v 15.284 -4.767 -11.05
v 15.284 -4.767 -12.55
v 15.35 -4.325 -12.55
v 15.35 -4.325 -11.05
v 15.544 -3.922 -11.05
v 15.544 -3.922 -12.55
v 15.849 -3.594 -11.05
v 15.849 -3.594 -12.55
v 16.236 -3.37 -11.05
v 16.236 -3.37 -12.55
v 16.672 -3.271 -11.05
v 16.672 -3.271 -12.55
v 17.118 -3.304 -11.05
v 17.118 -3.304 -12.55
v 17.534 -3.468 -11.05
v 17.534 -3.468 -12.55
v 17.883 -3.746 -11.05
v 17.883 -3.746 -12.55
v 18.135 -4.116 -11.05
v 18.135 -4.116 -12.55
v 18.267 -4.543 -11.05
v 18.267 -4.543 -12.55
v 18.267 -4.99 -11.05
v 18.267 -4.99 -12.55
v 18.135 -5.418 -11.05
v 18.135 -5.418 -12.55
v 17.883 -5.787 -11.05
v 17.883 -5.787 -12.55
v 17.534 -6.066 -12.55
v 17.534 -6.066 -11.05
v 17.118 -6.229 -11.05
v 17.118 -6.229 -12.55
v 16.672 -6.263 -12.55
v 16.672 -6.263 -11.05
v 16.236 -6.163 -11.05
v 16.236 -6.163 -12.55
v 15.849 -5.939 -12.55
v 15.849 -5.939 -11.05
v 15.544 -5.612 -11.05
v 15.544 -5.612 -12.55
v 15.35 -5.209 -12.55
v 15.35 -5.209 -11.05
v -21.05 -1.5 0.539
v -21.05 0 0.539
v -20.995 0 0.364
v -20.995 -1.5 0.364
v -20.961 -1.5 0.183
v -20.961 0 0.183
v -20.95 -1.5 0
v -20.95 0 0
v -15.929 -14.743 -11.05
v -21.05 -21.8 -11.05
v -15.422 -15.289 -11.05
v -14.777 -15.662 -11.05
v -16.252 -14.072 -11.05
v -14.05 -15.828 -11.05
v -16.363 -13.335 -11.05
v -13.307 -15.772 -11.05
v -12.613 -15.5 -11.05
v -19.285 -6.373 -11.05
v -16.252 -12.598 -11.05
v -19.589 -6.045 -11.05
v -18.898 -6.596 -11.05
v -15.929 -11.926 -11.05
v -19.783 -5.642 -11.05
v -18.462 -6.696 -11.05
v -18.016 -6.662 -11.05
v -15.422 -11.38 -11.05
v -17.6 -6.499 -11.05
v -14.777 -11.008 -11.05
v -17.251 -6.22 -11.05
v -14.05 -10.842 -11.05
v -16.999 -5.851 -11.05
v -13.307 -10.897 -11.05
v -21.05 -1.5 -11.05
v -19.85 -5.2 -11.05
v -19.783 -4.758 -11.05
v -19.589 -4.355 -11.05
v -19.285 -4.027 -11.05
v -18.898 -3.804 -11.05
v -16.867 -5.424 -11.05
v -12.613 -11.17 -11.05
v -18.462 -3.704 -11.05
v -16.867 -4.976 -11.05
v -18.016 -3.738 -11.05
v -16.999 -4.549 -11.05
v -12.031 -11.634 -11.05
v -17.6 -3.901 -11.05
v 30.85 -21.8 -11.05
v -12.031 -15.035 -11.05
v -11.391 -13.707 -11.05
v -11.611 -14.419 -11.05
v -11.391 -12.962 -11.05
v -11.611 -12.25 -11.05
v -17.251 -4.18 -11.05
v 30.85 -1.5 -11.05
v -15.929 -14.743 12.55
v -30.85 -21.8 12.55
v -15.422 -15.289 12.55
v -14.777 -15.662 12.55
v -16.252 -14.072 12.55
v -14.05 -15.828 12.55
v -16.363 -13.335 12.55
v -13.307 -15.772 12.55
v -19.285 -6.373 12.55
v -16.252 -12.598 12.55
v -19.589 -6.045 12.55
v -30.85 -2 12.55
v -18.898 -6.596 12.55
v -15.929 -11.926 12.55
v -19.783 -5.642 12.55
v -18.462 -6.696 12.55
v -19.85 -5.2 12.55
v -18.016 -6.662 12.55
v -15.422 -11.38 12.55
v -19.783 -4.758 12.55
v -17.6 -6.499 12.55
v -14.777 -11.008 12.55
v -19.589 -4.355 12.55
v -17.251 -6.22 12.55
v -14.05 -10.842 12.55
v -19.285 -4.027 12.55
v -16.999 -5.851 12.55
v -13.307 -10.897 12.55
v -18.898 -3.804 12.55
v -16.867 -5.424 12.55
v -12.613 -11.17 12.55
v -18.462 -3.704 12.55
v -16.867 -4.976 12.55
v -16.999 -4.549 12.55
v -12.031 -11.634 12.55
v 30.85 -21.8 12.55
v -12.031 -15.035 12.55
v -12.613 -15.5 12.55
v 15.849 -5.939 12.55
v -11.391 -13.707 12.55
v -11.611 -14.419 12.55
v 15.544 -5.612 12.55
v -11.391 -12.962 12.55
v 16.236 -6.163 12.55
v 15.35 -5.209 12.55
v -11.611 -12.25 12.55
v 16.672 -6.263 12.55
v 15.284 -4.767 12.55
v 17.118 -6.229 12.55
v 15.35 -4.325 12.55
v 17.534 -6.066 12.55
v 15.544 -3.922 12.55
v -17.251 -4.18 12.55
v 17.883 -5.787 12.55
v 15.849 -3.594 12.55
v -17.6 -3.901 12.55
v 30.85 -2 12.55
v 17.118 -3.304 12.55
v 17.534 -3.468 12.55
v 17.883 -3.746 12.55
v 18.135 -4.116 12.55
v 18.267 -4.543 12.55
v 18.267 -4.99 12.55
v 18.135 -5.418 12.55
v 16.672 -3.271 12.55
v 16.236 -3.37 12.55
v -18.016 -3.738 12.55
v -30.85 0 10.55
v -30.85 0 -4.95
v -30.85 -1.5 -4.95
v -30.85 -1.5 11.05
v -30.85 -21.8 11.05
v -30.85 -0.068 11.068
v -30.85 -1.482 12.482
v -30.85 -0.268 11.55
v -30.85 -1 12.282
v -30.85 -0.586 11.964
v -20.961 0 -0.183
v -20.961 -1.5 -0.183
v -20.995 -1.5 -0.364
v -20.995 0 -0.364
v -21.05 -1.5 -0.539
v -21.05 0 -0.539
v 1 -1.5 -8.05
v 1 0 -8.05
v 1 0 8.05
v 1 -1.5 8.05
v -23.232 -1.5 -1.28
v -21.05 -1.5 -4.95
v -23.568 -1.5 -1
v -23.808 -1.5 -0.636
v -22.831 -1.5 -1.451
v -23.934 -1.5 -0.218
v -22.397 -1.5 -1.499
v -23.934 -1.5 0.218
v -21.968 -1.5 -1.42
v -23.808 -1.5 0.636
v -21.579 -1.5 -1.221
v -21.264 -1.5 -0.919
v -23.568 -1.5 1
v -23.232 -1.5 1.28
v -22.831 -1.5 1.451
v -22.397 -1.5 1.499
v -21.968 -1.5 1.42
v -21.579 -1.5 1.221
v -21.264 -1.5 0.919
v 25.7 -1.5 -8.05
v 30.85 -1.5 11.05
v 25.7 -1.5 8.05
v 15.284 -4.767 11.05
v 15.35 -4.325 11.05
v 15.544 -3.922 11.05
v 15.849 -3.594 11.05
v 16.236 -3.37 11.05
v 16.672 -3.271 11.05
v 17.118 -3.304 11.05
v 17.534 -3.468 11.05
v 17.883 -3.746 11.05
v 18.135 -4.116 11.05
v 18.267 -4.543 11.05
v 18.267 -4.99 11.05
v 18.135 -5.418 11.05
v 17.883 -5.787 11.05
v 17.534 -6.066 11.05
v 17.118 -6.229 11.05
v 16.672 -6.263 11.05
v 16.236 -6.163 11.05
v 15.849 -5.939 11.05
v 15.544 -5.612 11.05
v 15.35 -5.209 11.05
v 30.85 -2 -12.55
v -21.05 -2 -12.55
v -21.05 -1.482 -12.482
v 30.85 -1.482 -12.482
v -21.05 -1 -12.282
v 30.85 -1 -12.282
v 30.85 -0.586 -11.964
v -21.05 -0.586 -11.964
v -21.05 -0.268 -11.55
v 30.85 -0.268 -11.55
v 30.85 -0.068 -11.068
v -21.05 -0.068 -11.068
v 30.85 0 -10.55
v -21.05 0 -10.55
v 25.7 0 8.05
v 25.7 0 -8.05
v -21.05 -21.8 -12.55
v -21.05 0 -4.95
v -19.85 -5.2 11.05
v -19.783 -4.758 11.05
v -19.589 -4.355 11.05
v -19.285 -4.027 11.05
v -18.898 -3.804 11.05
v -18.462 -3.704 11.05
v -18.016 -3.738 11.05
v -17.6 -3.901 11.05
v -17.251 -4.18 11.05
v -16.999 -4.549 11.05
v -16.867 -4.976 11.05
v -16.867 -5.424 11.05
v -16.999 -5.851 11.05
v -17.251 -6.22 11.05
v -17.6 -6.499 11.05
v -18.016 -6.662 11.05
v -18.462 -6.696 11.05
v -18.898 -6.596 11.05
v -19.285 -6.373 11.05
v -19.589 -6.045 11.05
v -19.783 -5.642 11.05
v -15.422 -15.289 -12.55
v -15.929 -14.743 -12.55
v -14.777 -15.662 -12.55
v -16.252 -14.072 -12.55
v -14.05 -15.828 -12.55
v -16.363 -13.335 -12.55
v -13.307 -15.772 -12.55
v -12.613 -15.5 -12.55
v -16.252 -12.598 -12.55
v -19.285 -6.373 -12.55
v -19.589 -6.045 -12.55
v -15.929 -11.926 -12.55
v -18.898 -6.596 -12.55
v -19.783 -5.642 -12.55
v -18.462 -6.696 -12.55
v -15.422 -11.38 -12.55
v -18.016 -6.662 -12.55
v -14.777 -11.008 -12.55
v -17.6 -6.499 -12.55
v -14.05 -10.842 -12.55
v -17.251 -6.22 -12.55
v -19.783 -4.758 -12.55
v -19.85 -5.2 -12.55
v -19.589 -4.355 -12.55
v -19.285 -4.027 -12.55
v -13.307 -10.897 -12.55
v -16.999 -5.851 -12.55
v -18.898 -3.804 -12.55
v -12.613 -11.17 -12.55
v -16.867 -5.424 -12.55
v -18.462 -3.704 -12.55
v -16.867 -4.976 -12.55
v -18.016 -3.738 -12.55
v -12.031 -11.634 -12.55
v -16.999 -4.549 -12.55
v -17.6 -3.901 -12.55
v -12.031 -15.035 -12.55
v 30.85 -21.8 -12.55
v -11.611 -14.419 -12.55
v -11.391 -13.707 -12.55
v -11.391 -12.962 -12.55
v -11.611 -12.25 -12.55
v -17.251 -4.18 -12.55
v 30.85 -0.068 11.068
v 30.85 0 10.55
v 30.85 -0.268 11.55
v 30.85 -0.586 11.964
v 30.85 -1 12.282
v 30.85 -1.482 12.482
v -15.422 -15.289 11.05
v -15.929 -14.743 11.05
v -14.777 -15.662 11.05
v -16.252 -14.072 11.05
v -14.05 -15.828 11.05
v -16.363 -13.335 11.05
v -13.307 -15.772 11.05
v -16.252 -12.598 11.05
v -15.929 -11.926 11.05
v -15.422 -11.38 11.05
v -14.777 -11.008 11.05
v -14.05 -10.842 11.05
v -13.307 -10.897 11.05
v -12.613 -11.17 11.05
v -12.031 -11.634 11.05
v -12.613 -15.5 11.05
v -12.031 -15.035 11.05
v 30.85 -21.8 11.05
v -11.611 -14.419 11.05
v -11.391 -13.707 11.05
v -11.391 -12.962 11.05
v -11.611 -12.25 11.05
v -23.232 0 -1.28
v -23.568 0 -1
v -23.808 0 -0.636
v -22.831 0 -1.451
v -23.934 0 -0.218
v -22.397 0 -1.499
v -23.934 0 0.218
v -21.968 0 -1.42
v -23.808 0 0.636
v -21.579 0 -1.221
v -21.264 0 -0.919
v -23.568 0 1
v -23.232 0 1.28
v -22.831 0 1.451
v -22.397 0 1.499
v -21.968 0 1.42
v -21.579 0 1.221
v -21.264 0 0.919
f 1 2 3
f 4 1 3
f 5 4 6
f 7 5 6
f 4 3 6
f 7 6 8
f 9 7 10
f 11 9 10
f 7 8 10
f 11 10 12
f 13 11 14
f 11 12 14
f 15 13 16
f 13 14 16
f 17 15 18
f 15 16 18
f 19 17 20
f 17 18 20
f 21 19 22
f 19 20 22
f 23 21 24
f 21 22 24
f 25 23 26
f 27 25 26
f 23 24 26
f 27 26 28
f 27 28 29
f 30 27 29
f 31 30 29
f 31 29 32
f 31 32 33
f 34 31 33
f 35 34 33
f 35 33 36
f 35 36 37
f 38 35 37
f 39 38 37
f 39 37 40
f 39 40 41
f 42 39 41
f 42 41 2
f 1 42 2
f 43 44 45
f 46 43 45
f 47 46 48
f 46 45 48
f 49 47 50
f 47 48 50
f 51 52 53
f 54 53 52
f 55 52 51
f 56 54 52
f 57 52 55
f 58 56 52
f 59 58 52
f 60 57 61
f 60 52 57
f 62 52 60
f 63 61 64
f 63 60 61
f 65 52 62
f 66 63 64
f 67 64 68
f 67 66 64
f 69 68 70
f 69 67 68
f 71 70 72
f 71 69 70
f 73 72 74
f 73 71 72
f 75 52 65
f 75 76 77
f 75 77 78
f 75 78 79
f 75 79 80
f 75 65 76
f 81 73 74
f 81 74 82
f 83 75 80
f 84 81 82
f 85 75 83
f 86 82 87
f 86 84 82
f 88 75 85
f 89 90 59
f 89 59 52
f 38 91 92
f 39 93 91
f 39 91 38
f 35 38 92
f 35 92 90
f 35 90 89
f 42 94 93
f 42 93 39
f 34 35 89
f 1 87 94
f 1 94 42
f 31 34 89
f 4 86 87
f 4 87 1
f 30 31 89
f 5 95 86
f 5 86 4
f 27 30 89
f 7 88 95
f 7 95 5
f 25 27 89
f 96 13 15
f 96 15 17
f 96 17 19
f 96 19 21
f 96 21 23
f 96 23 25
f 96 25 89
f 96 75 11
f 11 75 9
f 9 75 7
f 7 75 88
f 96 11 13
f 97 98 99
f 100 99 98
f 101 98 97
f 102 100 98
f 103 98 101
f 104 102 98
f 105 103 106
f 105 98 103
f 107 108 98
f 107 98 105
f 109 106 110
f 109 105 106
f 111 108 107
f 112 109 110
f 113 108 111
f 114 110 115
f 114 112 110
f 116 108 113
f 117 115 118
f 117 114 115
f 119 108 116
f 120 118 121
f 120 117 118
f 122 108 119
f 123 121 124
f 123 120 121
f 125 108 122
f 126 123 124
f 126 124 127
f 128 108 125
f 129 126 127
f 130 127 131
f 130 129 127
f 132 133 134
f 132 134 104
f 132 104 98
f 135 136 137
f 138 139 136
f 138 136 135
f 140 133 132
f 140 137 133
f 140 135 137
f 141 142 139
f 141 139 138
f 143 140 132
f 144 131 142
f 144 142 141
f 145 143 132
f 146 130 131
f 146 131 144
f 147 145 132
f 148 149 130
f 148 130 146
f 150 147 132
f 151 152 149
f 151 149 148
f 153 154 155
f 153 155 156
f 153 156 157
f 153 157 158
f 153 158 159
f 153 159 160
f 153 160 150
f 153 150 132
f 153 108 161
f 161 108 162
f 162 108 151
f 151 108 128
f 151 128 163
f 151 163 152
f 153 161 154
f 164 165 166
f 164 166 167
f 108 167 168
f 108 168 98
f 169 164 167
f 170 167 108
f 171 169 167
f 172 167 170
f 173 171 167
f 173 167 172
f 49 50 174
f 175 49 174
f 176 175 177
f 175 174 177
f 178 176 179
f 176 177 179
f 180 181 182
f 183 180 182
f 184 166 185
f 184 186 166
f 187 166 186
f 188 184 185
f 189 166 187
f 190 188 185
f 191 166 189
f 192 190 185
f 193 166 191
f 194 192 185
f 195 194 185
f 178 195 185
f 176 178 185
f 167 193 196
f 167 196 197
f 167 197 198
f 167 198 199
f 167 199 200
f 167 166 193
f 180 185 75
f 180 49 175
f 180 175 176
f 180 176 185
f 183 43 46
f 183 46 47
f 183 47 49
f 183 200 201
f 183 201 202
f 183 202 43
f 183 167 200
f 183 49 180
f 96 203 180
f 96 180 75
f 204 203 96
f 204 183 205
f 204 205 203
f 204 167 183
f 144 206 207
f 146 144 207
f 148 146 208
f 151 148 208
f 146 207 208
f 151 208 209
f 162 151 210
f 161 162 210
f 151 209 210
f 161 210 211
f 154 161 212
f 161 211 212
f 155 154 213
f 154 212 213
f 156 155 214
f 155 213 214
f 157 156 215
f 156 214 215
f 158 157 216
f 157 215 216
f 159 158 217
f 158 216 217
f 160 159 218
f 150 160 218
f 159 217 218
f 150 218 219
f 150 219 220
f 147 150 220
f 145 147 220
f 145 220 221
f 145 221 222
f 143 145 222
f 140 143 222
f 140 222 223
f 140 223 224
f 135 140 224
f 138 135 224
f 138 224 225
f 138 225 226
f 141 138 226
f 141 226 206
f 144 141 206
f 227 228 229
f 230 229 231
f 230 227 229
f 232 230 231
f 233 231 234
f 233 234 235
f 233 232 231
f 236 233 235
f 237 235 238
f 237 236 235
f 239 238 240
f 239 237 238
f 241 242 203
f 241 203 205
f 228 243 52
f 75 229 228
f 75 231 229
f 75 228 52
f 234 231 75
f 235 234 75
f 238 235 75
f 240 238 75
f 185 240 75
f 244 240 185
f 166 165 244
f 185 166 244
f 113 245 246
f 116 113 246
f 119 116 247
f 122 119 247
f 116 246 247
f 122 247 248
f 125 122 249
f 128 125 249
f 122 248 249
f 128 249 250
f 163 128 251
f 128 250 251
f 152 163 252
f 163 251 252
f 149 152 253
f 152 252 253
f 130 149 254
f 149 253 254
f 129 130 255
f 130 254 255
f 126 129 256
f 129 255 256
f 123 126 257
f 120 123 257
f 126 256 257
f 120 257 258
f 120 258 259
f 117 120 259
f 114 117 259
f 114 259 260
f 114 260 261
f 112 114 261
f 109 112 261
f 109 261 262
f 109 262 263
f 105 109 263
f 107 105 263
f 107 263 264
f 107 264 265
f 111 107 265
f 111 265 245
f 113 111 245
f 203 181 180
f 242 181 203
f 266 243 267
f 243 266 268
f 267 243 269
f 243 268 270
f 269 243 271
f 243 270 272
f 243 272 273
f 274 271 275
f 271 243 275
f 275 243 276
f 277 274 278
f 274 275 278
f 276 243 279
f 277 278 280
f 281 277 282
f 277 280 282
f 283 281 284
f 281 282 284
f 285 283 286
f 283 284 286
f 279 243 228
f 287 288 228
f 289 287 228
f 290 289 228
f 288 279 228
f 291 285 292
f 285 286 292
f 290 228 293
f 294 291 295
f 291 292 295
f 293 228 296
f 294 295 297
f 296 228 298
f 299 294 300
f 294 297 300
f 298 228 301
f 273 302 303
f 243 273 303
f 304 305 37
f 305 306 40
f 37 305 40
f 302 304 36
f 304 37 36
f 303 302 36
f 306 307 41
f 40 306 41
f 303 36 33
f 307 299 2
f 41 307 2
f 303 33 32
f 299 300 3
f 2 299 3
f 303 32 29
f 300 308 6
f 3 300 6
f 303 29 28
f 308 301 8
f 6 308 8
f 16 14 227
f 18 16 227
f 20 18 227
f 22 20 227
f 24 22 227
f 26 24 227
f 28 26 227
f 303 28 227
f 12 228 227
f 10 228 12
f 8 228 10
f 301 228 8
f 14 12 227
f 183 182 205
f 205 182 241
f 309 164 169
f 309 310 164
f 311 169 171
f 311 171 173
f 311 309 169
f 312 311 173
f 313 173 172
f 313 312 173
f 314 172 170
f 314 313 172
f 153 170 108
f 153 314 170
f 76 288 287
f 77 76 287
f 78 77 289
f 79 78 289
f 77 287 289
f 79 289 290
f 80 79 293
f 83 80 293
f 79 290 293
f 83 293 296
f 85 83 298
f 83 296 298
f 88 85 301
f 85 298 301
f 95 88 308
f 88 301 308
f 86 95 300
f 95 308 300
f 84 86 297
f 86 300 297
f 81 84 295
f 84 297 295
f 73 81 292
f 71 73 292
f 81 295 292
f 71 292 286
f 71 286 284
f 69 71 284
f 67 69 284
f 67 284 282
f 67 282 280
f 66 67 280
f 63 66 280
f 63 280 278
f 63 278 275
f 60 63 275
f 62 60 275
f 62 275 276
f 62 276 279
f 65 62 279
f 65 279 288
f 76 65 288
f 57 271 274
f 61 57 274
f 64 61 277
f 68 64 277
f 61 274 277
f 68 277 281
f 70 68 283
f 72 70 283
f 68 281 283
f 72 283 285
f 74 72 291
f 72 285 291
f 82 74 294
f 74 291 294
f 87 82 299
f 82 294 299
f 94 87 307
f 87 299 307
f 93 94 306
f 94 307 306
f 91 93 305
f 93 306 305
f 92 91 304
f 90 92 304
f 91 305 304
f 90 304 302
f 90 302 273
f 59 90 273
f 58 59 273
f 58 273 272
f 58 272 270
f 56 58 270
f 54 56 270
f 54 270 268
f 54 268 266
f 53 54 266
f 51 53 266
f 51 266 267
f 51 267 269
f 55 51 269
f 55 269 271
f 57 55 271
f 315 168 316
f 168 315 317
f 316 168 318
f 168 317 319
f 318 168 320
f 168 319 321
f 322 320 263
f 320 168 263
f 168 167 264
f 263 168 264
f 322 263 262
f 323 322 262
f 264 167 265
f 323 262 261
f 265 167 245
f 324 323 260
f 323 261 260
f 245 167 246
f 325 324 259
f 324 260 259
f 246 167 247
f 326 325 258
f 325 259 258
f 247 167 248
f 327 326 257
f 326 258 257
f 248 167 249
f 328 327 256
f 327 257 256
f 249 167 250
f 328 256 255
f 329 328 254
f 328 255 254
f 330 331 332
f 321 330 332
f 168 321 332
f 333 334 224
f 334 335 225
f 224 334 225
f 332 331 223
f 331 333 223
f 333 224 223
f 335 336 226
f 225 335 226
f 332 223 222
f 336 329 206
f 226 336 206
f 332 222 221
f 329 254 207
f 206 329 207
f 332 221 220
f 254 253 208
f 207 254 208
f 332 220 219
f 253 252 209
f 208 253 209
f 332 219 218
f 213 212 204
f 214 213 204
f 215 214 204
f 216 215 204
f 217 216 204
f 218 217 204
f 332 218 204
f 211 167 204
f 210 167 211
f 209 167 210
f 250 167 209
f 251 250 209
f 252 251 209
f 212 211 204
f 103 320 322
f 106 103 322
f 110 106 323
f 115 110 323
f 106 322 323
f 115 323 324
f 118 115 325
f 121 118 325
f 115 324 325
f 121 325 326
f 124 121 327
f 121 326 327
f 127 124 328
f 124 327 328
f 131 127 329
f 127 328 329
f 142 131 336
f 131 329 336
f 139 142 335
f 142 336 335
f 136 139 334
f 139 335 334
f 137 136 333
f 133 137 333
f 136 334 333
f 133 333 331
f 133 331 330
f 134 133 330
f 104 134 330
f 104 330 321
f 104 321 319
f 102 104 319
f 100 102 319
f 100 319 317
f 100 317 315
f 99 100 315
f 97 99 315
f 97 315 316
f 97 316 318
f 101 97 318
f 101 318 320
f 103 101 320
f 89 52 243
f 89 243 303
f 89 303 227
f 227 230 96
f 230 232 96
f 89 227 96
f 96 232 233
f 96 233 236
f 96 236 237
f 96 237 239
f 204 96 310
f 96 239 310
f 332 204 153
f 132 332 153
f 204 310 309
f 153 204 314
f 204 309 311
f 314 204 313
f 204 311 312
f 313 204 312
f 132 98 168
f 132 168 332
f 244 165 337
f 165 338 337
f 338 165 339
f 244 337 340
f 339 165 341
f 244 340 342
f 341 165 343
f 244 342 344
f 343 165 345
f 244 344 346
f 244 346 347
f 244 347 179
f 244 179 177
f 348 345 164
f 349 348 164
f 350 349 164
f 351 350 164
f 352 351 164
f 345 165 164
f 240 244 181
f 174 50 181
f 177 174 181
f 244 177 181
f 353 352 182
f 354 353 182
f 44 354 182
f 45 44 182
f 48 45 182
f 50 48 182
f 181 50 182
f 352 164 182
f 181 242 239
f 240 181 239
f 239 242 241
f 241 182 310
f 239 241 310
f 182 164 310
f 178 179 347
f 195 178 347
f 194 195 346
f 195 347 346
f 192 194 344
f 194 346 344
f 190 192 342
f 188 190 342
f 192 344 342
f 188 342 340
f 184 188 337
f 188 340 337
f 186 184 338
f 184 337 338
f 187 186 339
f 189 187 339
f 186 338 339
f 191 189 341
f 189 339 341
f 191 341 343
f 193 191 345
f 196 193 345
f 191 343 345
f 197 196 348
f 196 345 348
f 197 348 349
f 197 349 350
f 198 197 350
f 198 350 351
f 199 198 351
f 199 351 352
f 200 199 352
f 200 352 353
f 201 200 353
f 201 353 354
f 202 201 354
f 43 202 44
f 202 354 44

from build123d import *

# Parameters (mm, degrees)
F0_W     = 24.7
F0_H     = 16.1
F1_DEPTH = 1.5
F0_W_2   = 51.9
F0_H_2   = 1.5
F2_DEPTH = 21.8
F0_W_3   = 61.7
F3_DEPTH = 21.8
F4_R     = 2
F6_D     = 5
F6_DEPTH = 100
F7_D     = 3
F7_DEPTH = 100
F8_D     = 3


with BuildPart() as f1:
    # F0 (on Front) → F1 (new body)
    with BuildSketch(Plane.XZ):
        Polygon((30.85, 11.05), (-30.85, 11.05), (-30.85, -4.95), (-21.05, -4.95), (-21.05, -11.05), (30.85, -11.05), align=None)
        with BuildLine():
            ThreePointArc((-20.95, 0), (-20.975212, -0.273861), (-21.05, -0.538516))
            ThreePointArc((-21.05, -0.538516), (-23.95, 0), (-21.05, 0.538516))
            ThreePointArc((-21.05, 0.538516), (-20.975212, 0.273861), (-20.95, 0))
        make_face(mode=Mode.SUBTRACT)
        with Locations((13.35, 0)):
            Rectangle(F0_W, F0_H, mode=Mode.SUBTRACT)
    extrude(amount=F1_DEPTH)

    # F0 (on Front) → F2 (join)
    with BuildSketch(Plane.XZ):
        with Locations((4.9, -11.8)):
            Rectangle(F0_W_2, F0_H_2)
    extrude(amount=F2_DEPTH)

    # F0 (on Front) → F3 (join)
    with BuildSketch(Plane.XZ):
        with Locations((0, 11.8)):
            Rectangle(F0_W_3, F0_H_2)
    extrude(amount=F3_DEPTH)

    # F4
    f4_edges = [f1.edges().sort_by_distance(p)[0] for p in [
        (0, 0, 12.55),
        (4.9, 0, -12.55),
    ]]
    fillet(f4_edges, radius=F4_R)

    # F6
    with Locations(Plane.XY.offset(12.55)):
        with Locations((-13.863446, -13.334782)):
            Hole(F6_D / 2, depth=F6_DEPTH)

    # F7
    with Locations(Plane.XY.offset(12.55)):
        with Locations((16.783738, -4.766752)):
            Hole(F7_D / 2, depth=F7_DEPTH)

    # F8 (through all)
    with Locations(Plane.XY.offset(12.55)):
        with Locations((-18.35013, -5.2)):
            Hole(F8_D / 2)


solid = f1.part
